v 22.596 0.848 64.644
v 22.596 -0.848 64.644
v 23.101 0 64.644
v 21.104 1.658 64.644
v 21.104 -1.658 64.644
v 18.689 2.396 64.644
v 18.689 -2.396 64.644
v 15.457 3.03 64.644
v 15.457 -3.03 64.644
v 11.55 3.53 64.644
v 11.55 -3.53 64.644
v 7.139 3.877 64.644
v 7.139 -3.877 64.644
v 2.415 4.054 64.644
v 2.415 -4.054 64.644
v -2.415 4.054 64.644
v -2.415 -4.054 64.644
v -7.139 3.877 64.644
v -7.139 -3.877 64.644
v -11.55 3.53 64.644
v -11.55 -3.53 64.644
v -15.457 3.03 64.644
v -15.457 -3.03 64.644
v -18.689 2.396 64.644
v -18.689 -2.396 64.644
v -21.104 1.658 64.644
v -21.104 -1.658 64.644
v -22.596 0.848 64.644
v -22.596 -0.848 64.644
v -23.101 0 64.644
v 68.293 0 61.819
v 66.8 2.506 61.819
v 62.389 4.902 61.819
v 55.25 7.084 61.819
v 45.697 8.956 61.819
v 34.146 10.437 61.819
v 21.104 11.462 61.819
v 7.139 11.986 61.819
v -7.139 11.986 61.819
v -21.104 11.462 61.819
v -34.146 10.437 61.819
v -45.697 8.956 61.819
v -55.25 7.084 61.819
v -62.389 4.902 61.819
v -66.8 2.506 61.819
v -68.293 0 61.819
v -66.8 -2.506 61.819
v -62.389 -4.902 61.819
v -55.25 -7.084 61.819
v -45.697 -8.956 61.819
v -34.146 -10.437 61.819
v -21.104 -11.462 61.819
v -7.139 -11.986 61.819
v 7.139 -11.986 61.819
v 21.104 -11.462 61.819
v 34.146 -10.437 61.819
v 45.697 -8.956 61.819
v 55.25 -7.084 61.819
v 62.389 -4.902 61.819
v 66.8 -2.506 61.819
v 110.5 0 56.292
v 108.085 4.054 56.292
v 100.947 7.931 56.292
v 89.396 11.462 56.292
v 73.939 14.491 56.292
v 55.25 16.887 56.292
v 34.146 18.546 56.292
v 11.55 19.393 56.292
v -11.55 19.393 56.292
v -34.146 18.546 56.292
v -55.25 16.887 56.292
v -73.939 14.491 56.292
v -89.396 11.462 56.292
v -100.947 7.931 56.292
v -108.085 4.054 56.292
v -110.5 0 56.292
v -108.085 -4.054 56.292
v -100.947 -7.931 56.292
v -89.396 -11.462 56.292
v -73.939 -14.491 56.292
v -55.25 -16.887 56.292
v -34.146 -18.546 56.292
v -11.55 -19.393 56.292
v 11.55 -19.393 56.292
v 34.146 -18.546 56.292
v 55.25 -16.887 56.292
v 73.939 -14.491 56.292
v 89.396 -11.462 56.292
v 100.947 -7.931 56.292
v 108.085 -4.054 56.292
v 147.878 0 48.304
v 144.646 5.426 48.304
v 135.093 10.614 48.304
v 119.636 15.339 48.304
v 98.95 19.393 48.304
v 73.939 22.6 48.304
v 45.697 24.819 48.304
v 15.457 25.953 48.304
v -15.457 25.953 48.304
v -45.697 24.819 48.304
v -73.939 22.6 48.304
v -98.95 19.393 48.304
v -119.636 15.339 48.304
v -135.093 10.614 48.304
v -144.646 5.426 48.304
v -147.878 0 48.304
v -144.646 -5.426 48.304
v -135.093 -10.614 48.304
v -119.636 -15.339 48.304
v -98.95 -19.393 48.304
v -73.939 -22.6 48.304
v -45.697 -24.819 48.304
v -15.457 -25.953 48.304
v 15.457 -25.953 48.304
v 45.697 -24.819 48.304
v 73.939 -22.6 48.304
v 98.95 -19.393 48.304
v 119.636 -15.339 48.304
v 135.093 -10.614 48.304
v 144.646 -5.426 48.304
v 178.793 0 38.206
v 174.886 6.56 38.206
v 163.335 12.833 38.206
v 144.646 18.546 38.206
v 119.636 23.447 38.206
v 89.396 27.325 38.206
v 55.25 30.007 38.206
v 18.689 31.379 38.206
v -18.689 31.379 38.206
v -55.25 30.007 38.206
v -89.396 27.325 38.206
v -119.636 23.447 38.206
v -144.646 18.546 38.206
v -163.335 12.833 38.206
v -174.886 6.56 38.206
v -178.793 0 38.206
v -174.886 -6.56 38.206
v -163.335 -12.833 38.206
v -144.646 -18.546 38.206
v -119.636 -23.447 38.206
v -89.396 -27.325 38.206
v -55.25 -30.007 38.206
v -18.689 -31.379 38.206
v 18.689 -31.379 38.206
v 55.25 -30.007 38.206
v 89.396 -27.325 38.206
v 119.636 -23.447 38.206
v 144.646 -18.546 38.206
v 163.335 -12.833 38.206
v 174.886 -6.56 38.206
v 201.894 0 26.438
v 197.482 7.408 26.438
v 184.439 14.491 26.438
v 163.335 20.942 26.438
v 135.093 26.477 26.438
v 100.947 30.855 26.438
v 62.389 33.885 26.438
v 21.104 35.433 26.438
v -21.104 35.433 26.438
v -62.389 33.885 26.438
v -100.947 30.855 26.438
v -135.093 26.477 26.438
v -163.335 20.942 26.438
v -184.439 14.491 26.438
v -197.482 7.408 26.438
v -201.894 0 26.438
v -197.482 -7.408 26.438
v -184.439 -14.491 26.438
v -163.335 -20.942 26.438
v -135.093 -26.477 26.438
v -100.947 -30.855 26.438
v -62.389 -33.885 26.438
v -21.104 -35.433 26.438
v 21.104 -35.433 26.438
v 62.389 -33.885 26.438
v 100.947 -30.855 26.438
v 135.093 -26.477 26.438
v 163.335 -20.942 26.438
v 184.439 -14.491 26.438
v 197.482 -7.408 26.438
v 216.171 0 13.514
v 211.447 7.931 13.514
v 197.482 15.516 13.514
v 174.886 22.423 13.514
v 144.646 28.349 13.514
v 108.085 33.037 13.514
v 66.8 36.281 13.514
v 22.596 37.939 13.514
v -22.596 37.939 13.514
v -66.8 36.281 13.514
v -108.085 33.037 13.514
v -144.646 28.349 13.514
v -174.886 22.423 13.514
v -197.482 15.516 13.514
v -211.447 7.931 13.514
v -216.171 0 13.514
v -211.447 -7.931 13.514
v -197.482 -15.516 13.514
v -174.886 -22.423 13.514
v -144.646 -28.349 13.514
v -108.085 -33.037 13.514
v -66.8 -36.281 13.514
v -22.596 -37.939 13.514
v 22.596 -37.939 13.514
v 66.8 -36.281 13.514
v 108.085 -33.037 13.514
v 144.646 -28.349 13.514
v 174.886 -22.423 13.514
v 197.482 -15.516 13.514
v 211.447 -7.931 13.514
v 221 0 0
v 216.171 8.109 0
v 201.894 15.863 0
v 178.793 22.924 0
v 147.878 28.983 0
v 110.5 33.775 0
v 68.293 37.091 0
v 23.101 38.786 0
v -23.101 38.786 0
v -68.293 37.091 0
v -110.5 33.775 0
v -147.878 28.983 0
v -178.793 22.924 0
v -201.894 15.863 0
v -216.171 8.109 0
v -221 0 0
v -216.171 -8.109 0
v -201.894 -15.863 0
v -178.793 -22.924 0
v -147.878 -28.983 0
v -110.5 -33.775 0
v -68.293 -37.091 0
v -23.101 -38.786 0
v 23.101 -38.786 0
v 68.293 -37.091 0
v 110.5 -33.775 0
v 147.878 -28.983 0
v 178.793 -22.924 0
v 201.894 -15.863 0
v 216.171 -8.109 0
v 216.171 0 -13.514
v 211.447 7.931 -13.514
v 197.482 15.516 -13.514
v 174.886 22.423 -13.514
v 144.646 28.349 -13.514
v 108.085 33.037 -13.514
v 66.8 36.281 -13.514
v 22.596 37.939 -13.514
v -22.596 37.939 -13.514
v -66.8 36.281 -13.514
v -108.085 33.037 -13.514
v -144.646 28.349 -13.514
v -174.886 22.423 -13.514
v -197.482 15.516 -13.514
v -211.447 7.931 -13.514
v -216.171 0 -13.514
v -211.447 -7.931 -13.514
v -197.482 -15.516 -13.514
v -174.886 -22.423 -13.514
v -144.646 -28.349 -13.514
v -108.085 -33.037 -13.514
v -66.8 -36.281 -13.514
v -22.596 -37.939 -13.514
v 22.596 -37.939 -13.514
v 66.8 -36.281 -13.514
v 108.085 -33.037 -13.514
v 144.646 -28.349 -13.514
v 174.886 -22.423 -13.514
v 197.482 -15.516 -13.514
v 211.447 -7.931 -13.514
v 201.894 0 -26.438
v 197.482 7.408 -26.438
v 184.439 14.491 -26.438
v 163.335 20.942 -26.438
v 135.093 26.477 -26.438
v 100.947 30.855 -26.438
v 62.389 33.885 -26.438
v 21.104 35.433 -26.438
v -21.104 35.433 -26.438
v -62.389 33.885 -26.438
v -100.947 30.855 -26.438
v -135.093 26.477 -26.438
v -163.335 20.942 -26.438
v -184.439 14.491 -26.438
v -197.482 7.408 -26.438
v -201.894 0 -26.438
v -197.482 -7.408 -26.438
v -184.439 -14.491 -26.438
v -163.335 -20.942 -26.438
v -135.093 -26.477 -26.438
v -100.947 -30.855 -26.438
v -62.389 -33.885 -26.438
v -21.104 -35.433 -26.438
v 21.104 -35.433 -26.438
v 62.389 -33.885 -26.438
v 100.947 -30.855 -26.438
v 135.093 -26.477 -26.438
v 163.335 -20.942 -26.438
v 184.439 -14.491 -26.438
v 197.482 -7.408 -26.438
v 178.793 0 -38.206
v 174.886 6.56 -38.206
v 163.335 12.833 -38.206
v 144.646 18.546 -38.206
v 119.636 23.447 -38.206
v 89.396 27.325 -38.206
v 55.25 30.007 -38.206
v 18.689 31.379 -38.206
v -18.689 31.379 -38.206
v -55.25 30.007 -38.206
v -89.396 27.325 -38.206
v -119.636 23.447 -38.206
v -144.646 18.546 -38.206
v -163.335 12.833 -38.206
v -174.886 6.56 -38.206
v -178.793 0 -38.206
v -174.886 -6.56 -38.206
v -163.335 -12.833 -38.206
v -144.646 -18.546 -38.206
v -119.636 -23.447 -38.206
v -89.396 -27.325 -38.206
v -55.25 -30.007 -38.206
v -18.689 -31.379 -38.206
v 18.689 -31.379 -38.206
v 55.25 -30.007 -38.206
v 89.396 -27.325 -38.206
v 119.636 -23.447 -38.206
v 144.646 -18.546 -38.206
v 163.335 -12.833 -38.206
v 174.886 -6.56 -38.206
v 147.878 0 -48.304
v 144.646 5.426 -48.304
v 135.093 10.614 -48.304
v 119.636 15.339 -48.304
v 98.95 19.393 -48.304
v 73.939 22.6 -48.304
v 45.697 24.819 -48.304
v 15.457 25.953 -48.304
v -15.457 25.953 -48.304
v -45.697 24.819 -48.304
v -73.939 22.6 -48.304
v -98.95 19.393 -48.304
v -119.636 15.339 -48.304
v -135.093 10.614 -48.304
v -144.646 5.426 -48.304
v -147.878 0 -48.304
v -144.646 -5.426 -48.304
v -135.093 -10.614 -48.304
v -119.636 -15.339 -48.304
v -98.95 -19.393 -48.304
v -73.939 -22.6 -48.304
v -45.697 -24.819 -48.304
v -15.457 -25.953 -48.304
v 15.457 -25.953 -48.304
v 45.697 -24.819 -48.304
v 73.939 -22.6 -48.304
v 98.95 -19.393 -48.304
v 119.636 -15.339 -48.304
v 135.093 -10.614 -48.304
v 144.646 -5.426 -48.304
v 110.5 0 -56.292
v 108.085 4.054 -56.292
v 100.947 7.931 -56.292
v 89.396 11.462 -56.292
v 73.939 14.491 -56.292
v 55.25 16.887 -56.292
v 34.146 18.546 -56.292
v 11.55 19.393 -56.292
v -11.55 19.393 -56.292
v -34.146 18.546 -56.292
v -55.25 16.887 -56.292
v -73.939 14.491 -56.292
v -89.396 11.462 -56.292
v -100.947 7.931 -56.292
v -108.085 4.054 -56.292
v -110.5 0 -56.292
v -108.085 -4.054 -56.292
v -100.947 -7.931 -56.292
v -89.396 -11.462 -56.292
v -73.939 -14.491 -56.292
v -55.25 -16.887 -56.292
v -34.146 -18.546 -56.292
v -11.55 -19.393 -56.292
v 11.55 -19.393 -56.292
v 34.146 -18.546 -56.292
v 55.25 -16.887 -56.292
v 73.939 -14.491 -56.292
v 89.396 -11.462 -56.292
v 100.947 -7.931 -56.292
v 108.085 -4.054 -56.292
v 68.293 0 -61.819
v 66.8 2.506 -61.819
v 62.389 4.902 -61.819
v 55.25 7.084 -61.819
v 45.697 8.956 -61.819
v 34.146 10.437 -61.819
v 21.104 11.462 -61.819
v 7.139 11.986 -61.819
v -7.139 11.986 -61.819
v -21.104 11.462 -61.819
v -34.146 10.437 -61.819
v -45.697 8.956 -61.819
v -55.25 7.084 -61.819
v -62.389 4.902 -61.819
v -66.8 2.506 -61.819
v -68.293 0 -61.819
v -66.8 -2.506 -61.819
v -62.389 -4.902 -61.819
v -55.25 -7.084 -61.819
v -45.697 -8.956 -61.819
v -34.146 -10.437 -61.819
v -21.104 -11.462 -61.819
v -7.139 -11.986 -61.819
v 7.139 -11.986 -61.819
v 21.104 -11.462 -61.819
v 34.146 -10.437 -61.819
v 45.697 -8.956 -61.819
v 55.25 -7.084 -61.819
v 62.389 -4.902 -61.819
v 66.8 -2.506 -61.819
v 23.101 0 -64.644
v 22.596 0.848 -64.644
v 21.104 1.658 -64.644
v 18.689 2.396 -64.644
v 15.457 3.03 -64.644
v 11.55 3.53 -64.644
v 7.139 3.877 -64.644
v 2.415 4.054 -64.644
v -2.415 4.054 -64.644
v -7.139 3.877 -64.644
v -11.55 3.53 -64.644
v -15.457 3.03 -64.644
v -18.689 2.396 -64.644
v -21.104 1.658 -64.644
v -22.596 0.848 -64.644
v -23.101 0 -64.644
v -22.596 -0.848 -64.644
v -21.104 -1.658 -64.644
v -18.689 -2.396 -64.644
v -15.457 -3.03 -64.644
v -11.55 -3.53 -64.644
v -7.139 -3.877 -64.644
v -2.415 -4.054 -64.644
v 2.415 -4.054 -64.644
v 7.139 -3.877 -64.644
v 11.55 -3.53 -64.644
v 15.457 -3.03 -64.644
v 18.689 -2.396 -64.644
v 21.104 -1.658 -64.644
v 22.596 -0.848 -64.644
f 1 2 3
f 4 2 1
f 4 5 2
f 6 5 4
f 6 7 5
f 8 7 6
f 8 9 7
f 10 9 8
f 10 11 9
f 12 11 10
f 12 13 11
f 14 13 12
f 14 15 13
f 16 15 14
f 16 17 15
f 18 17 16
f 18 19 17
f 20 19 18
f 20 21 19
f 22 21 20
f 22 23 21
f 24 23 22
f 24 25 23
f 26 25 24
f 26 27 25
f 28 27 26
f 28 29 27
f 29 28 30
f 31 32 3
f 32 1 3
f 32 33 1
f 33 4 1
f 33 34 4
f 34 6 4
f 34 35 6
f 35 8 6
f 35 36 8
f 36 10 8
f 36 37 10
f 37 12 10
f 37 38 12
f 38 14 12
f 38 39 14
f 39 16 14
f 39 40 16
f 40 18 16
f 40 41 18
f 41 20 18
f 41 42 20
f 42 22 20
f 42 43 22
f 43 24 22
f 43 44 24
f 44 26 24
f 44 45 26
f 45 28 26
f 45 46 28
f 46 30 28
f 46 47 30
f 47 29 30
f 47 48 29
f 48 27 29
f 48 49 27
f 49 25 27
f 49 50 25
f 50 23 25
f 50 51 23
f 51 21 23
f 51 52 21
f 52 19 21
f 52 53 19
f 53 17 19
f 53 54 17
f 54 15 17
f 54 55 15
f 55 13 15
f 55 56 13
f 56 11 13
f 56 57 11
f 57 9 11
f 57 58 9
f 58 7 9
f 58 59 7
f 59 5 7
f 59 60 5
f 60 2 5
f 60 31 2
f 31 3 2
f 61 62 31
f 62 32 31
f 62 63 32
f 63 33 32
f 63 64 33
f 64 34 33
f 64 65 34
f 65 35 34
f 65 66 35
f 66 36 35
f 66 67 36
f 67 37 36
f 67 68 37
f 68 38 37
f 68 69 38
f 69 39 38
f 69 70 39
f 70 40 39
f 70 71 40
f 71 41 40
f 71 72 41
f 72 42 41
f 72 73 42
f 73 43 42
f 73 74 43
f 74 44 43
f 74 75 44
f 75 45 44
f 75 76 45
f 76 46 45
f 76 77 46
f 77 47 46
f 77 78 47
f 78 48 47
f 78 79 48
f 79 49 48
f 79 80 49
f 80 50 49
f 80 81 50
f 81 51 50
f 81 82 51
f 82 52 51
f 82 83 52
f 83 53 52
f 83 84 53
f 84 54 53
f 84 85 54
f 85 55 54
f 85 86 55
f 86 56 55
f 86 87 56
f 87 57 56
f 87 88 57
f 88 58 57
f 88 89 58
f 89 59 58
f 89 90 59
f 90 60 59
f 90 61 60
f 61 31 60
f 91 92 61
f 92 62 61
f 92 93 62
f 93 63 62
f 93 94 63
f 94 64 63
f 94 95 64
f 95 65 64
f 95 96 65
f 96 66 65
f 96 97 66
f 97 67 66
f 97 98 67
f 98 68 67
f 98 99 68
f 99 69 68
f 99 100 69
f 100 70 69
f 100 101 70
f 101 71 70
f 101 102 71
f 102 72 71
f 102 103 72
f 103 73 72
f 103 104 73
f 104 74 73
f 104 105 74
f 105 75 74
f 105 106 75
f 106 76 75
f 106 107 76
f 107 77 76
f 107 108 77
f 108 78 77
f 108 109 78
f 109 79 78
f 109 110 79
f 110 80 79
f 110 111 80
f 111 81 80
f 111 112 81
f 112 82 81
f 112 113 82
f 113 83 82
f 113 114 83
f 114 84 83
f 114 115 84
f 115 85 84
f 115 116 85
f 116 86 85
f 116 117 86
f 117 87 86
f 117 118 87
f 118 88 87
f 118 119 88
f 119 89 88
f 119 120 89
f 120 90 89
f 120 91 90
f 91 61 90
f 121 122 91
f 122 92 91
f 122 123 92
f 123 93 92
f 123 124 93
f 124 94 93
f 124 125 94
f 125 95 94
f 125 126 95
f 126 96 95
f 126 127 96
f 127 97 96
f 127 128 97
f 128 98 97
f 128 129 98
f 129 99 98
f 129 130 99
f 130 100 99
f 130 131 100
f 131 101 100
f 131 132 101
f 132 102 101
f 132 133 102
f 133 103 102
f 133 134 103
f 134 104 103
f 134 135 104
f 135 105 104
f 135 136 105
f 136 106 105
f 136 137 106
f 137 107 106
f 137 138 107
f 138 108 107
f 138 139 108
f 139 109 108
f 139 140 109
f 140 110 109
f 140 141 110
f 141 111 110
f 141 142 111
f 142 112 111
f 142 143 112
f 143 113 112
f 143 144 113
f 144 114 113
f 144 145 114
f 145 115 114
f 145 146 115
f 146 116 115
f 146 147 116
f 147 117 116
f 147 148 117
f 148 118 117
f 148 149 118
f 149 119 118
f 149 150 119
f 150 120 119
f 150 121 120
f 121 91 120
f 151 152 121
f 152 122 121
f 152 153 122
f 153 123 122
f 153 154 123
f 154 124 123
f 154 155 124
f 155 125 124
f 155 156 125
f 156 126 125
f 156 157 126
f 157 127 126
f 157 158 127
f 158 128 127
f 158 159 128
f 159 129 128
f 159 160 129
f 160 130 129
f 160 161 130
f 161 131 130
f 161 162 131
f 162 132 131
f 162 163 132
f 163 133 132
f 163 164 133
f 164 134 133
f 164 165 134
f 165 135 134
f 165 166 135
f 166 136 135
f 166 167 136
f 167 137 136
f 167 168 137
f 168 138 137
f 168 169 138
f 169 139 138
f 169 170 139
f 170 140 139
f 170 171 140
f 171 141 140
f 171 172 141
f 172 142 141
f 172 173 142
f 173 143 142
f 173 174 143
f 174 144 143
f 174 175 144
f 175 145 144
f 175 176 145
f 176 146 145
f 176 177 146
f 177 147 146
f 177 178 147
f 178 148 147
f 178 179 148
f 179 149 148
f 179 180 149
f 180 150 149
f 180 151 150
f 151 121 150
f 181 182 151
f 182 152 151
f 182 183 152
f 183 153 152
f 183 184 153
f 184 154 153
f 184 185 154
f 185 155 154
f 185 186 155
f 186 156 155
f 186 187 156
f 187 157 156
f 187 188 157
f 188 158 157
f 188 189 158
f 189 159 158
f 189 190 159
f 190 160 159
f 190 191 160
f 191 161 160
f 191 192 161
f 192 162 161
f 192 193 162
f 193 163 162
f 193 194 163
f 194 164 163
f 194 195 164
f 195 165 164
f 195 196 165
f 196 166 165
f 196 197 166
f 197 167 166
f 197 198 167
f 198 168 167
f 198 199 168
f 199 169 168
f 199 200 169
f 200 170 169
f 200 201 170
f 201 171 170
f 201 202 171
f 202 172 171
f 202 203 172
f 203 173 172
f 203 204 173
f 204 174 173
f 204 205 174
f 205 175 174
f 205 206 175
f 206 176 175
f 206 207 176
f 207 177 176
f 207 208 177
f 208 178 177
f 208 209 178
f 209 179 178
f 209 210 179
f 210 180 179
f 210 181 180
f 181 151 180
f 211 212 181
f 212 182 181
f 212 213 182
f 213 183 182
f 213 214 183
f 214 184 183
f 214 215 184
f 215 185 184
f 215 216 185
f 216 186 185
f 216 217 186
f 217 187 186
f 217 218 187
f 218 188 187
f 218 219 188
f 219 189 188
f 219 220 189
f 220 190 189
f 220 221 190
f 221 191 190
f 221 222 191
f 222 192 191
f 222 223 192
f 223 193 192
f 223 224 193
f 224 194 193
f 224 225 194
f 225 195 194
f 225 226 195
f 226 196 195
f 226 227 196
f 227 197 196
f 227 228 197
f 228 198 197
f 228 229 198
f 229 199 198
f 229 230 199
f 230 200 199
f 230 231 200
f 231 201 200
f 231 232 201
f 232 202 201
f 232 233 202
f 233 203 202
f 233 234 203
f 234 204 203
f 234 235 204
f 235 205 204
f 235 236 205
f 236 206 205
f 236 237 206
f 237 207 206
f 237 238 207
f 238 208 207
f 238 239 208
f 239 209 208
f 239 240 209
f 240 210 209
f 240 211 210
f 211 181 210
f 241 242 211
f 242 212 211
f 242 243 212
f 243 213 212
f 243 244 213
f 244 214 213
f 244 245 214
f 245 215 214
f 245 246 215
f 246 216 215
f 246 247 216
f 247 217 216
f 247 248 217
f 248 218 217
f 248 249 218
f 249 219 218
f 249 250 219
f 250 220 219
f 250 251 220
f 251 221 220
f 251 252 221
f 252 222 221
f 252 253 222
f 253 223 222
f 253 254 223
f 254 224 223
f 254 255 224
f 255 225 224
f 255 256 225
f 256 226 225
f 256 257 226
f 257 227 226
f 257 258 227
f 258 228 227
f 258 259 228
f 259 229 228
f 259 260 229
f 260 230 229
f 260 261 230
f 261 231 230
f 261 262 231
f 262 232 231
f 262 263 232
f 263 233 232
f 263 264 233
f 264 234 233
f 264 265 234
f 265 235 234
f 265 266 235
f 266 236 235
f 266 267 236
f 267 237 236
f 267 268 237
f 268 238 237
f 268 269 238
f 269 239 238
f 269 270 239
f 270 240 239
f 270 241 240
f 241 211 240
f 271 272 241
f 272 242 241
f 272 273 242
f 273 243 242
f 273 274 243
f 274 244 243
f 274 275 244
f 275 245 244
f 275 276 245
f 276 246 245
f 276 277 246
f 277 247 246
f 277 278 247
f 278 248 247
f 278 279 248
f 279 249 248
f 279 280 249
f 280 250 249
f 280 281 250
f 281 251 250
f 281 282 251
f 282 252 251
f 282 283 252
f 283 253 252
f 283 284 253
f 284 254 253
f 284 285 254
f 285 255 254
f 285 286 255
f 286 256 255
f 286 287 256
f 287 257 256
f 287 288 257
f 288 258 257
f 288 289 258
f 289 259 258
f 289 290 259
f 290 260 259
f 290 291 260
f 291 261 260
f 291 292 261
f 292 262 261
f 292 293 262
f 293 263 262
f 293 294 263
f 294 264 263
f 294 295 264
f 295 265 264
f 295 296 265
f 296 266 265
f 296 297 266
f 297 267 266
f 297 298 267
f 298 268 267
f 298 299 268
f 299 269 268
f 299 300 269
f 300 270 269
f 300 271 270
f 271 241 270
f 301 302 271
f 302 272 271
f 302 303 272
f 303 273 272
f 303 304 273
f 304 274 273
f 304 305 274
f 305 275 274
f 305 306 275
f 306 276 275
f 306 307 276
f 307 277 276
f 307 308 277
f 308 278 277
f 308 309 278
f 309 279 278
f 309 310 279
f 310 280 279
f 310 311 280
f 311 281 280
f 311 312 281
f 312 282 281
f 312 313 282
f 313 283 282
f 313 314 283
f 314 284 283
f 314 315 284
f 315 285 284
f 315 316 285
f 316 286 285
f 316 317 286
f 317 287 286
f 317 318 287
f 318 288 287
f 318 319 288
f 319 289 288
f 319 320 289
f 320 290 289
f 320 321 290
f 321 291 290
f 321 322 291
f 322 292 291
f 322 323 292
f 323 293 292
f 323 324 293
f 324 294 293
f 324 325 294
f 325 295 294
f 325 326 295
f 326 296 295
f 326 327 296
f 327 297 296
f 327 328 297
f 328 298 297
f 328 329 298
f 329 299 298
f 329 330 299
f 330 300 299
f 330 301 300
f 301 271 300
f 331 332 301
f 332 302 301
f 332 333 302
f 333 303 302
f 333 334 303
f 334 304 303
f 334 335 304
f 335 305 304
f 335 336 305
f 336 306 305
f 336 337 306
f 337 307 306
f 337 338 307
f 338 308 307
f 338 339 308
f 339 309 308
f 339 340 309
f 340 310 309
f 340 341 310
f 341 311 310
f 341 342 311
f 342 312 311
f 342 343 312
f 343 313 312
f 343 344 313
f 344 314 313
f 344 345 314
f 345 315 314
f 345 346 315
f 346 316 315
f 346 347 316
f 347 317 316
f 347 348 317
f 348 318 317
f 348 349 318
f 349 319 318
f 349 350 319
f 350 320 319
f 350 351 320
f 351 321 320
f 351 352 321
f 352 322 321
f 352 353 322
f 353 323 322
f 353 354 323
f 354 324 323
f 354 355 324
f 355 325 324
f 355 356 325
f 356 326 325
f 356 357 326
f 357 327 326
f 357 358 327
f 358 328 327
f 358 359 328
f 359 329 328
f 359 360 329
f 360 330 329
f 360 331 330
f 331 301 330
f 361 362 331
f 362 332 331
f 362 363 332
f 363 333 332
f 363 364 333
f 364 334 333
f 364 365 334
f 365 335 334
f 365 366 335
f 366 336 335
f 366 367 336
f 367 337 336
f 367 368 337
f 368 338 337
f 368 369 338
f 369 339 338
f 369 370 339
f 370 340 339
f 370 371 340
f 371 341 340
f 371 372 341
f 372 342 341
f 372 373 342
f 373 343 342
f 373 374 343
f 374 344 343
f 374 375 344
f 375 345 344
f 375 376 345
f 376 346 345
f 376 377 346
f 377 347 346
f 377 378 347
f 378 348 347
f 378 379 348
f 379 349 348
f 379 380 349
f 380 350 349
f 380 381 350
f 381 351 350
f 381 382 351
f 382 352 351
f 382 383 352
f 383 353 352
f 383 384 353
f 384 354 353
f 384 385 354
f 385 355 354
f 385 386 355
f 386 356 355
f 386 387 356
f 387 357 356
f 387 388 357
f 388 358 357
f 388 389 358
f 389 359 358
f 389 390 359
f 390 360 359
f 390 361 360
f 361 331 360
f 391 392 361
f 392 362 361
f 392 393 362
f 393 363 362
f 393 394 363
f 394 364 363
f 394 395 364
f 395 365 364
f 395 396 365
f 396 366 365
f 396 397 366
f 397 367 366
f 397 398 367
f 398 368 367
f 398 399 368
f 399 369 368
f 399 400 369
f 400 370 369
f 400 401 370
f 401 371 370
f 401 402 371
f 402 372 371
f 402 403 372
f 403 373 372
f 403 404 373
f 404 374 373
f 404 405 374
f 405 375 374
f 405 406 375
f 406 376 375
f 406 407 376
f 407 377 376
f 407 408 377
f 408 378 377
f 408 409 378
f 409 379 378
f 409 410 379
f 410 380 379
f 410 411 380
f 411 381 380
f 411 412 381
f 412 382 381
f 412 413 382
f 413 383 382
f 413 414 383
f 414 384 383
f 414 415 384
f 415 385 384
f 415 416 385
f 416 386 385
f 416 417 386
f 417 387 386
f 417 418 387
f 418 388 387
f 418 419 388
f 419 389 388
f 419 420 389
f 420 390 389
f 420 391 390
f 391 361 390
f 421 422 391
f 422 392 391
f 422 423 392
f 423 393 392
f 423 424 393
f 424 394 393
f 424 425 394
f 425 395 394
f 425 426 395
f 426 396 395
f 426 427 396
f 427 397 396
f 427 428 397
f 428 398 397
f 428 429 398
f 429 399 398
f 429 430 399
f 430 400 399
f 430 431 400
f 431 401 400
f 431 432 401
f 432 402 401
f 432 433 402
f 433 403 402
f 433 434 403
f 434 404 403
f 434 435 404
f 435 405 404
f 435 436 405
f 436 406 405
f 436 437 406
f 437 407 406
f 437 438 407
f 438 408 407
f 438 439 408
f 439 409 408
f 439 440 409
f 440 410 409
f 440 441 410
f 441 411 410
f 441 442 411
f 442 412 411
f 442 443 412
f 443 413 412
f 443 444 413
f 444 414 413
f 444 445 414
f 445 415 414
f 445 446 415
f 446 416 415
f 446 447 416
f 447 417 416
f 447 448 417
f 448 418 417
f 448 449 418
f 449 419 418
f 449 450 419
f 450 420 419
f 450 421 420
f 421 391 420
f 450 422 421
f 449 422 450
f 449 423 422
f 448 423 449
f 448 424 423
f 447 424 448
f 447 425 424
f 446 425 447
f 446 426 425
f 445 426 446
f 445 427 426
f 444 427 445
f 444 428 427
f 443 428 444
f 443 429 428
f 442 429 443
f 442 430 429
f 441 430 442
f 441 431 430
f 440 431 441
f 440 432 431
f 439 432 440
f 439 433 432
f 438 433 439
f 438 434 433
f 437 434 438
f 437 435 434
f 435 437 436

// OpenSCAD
// Generated by SolidPython 1.0.1 on 2020-07-29 00:46:52


scale(v = [17, 3, 5]) {
	sphere(r = 13);
}
/***********************************************
*********      SolidPython code:      **********
************************************************
 
# import packages: SolidPython
from solid import *
from solid.utils import *
from itertools import chain, combinations, permutations


class Resize:

    def __init__(self, scad_file):
        self.scad_file = scad_file
        #self.scad_file = import_scad(scad_file)
        # cone/cylinder param:
        self.r1 = 0
        self.r2 = 0
        self.h = 0
        # rectangular prism param:
        self.w = 0
        self.l = 0
        # ellipse param:
        self.r = 0

    # import OpenScad code (file name corresponds to shape)


    # classify shape + parameters
    def assign(self, param1, param2, param3):
        if self.scad_file == 'cone.scad':
            self.r1 = param1
            self.r2 = param2
            self.h = param3
        elif self.scad_file == 'cylinder.scad':
            self.r1 = param1
            self.r2 = param2
            self.h = param3
        elif self.scad_file == 'rectangularPrism.scad':
            self.h = param1
            self.l = param2
            self.w = param3
        else:
            self.r = param1
            self.h = param2

    # resize parameters
    def iterate(self):
        x = range(3, 20, 2)
        i = 1
        if self.scad_file == 'cone.scad':
            tempList = list(permutations(x, 2))
            for temp in tempList:
                param1 = temp[0]
                param2 = temp[1]
                filepath = 'produced_scad_files/' + 'cone' + str(param1) + '_' + str(param2) + '_' + '.scad'
                scad_render_to_file(cylinder(h=param1, r1=param2, r2=0), filepath)

        elif self.scad_file == 'cylinder.scad':
            tempList = list(permutations(x, 3))
            for temp in tempList:
                param1 = temp[0]
                param2 = temp[1]
                filepath = 'produced_scad_files/' + 'cylinder' + str(param1) + '_' + str(param2) + '_' + '.scad'
                scad_render_to_file(cylinder(h=param1, r1=param2, r2=param2), filepath)

        elif self.scad_file == 'rectangularPrism.scad':
            tempList = list(permutations(x, 3))
            for temp in tempList:
                param1 = temp[0]
                param2 = temp[1]
                param3 = temp[2]
                filepath = 'produced_scad_files/' + 'rectangularPrism' + str(param1) + '_' + str(param2) + '_' + str(
                    param3) + '.scad'
                scad_render_to_file(cube(size=(param1, param2, param3)), filepath)

        elif self.scad_file == 'ellipse.scad':
            tempList = list(permutations(x, 4))
            for temp in tempList:
                param1 = temp[0]
                param2 = temp[1]
                param3 = temp[2]
                param4 = temp[3]
                filepath = 'produced_scad_files/' + 'ellipse' + str(param1) + '_' + str(param2) + '_' + str(param3) + '_' + str(param4) + '.scad'
                scad_render_to_file(scale([param1, param2, param3])(sphere(r=param4)), filepath)

    def render_to_scadfile(self):
        scad_render_to_file(scad, 'example.scad') 
 
************************************************/
